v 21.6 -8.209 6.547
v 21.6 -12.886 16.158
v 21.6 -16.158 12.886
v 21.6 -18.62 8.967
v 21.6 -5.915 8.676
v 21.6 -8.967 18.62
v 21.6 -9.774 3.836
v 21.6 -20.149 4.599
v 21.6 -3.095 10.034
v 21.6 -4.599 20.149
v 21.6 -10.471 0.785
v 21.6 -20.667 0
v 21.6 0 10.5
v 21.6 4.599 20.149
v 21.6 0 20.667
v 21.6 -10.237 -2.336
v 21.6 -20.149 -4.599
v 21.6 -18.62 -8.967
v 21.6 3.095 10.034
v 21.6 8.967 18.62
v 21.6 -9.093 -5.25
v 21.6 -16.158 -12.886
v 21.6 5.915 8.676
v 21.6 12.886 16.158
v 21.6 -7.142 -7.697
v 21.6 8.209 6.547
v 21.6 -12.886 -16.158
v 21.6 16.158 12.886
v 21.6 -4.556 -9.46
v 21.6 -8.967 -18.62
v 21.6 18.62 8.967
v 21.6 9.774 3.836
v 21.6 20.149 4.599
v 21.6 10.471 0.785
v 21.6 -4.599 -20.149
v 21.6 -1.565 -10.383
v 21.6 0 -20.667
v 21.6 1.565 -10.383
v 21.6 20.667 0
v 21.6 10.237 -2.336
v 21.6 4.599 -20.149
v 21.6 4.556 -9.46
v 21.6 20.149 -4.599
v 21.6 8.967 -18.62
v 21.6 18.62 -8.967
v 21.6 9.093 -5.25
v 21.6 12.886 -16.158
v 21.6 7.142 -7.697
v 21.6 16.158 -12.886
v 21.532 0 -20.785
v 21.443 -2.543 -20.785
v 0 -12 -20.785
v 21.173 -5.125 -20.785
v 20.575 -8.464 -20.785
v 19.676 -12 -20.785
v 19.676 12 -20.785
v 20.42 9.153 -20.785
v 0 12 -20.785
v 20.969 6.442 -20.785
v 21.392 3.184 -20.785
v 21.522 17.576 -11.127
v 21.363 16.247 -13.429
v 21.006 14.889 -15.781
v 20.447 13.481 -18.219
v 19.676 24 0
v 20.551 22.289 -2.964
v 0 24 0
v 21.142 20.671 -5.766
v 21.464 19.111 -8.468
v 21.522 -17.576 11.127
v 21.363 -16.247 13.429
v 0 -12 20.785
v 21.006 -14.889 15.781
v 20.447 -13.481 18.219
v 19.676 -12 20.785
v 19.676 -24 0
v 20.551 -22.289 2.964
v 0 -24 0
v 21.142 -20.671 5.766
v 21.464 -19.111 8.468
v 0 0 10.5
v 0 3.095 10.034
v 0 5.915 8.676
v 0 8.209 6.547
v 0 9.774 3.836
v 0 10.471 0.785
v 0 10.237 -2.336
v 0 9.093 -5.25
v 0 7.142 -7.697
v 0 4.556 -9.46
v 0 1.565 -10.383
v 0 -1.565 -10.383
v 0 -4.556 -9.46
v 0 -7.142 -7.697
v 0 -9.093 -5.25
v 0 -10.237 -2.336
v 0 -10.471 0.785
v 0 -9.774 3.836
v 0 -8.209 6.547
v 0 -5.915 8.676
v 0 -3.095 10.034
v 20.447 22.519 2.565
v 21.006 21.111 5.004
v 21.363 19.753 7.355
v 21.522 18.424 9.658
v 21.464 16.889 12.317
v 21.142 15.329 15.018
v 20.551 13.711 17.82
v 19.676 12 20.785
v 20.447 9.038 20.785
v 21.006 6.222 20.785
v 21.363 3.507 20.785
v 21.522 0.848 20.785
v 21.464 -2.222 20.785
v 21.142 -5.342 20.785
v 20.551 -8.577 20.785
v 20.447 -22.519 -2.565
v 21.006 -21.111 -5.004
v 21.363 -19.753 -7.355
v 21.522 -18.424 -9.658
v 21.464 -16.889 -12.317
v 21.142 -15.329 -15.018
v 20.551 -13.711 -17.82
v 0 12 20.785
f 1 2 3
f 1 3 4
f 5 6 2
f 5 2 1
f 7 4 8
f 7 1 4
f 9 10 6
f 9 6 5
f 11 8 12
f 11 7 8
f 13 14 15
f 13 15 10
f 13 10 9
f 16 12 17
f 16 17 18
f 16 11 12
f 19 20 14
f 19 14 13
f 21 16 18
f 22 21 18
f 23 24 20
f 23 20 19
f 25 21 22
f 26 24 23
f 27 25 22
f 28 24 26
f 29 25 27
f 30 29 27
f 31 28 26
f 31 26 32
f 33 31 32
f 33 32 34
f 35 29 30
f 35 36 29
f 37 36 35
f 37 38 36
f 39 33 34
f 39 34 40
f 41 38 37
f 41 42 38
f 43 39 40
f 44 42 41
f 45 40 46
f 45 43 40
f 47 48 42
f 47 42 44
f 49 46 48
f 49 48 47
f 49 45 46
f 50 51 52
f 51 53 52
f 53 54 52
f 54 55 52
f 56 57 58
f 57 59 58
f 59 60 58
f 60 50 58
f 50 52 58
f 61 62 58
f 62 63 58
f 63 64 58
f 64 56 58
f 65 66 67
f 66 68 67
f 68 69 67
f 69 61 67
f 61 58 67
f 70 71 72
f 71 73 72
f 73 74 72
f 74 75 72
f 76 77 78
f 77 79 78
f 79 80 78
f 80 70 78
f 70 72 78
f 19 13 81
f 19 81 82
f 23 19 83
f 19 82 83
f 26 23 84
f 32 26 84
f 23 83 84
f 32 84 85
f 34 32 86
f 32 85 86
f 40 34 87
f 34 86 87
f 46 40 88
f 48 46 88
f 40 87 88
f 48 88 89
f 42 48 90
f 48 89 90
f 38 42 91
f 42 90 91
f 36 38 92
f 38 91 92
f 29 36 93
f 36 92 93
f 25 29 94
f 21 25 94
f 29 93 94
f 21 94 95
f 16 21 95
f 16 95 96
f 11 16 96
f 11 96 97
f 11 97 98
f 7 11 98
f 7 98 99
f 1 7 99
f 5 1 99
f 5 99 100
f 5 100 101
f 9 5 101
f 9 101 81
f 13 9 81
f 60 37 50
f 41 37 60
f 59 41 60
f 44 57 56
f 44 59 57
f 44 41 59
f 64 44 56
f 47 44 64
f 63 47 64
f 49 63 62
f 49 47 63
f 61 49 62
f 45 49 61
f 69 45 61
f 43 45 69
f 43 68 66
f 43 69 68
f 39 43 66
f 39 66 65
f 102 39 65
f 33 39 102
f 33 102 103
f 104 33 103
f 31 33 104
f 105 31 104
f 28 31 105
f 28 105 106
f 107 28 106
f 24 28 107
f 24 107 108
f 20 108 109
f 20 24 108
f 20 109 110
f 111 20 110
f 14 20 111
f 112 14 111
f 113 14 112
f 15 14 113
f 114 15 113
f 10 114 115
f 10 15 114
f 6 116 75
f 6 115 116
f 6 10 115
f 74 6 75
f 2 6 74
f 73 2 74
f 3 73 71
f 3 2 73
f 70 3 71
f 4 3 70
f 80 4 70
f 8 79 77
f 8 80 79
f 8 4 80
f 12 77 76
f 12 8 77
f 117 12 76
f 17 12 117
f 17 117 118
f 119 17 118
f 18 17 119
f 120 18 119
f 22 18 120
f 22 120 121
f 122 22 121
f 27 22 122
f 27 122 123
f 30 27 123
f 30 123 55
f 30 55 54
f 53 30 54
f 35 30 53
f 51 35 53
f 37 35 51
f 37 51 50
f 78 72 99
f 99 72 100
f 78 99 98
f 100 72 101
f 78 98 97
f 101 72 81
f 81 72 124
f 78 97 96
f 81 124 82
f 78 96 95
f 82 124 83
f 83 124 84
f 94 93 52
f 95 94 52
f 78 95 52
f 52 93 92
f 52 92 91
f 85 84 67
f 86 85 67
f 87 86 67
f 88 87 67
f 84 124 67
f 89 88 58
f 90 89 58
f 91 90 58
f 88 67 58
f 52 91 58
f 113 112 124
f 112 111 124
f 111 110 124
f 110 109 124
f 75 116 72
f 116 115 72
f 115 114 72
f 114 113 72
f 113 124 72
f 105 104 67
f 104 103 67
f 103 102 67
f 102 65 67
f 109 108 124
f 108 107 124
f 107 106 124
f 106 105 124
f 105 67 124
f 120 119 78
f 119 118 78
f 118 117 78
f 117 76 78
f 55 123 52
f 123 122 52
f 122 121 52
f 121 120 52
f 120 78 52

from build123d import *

# Parameters (mm, degrees)
BOSS_EXTRUDE1_DEPTH = 21.6
SKETCH2_OUTSIDE_W   = 131.808
SKETCH2_OUTSIDE_H   = 138.238
SKETCH2_OUTSIDE_R   = 20.667093795
CUT_EXTRUDE2_DEPTH  = 21.6
CUT_EXTRUDE2_DRAFT  = -60
M24_TAPPED_HOLE1_D  = 21


with BuildPart() as part:
    # Sketch1 → Boss-Extrude1 (new body)
    with BuildSketch(Plane(origin=(0, 0, 0), x_dir=(0, 0, -1), z_dir=(1, 0, 0))):
        Polygon((0, -24), (20.784609691, -12), (20.784609691, 12), (0, 24), (-20.784609691, 12), (-20.784609691, -12), align=None)
    extrude(amount=BOSS_EXTRUDE1_DEPTH)


with BuildPart() as cut_extrude2_tool:
    # Sketch2 outside → Cut-Extrude2 (with draft: the straight prism first)
    with BuildSketch(Plane(origin=(21.6, 0, 0), x_dir=(0, 0, -1), z_dir=(1, 0, 0))):
        Rectangle(SKETCH2_OUTSIDE_W, SKETCH2_OUTSIDE_H)
        Circle(SKETCH2_OUTSIDE_R, mode=Mode.SUBTRACT)
    extrude(amount=-CUT_EXTRUDE2_DEPTH)
    # Cut-Extrude2: the draft: its side faces are tilted about the plane it starts from
    cut_extrude2_sides = [cut_extrude2_tool.faces().sort_by_distance(p)[0] for p in [
        (10.8, -69.119, 0),
        (10.8, 0, -65.904),
        (10.8, 69.119, 0),
        (10.8, 0, 65.904),
        (10.8, 0, 20.667093795),
    ]]
    draft(cut_extrude2_sides, Plane(origin=(21.6, 0, 0), x_dir=(0, 0, -1), z_dir=(1, 0, 0)), CUT_EXTRUDE2_DRAFT)


with BuildPart() as part_1:
    add(part.part)

    # Cut-Extrude2: cut by cut_extrude2_tool
    add(cut_extrude2_tool.part, mode=Mode.SUBTRACT)

    # M24 Tapped Hole1 (through all)
    with Locations(Plane(origin=(21.6, 0, 0), x_dir=(0, 0, -1), z_dir=(1, 0, 0))):
        with Locations((0, 0)):
            Hole(M24_TAPPED_HOLE1_D / 2)


solid = part_1.part
